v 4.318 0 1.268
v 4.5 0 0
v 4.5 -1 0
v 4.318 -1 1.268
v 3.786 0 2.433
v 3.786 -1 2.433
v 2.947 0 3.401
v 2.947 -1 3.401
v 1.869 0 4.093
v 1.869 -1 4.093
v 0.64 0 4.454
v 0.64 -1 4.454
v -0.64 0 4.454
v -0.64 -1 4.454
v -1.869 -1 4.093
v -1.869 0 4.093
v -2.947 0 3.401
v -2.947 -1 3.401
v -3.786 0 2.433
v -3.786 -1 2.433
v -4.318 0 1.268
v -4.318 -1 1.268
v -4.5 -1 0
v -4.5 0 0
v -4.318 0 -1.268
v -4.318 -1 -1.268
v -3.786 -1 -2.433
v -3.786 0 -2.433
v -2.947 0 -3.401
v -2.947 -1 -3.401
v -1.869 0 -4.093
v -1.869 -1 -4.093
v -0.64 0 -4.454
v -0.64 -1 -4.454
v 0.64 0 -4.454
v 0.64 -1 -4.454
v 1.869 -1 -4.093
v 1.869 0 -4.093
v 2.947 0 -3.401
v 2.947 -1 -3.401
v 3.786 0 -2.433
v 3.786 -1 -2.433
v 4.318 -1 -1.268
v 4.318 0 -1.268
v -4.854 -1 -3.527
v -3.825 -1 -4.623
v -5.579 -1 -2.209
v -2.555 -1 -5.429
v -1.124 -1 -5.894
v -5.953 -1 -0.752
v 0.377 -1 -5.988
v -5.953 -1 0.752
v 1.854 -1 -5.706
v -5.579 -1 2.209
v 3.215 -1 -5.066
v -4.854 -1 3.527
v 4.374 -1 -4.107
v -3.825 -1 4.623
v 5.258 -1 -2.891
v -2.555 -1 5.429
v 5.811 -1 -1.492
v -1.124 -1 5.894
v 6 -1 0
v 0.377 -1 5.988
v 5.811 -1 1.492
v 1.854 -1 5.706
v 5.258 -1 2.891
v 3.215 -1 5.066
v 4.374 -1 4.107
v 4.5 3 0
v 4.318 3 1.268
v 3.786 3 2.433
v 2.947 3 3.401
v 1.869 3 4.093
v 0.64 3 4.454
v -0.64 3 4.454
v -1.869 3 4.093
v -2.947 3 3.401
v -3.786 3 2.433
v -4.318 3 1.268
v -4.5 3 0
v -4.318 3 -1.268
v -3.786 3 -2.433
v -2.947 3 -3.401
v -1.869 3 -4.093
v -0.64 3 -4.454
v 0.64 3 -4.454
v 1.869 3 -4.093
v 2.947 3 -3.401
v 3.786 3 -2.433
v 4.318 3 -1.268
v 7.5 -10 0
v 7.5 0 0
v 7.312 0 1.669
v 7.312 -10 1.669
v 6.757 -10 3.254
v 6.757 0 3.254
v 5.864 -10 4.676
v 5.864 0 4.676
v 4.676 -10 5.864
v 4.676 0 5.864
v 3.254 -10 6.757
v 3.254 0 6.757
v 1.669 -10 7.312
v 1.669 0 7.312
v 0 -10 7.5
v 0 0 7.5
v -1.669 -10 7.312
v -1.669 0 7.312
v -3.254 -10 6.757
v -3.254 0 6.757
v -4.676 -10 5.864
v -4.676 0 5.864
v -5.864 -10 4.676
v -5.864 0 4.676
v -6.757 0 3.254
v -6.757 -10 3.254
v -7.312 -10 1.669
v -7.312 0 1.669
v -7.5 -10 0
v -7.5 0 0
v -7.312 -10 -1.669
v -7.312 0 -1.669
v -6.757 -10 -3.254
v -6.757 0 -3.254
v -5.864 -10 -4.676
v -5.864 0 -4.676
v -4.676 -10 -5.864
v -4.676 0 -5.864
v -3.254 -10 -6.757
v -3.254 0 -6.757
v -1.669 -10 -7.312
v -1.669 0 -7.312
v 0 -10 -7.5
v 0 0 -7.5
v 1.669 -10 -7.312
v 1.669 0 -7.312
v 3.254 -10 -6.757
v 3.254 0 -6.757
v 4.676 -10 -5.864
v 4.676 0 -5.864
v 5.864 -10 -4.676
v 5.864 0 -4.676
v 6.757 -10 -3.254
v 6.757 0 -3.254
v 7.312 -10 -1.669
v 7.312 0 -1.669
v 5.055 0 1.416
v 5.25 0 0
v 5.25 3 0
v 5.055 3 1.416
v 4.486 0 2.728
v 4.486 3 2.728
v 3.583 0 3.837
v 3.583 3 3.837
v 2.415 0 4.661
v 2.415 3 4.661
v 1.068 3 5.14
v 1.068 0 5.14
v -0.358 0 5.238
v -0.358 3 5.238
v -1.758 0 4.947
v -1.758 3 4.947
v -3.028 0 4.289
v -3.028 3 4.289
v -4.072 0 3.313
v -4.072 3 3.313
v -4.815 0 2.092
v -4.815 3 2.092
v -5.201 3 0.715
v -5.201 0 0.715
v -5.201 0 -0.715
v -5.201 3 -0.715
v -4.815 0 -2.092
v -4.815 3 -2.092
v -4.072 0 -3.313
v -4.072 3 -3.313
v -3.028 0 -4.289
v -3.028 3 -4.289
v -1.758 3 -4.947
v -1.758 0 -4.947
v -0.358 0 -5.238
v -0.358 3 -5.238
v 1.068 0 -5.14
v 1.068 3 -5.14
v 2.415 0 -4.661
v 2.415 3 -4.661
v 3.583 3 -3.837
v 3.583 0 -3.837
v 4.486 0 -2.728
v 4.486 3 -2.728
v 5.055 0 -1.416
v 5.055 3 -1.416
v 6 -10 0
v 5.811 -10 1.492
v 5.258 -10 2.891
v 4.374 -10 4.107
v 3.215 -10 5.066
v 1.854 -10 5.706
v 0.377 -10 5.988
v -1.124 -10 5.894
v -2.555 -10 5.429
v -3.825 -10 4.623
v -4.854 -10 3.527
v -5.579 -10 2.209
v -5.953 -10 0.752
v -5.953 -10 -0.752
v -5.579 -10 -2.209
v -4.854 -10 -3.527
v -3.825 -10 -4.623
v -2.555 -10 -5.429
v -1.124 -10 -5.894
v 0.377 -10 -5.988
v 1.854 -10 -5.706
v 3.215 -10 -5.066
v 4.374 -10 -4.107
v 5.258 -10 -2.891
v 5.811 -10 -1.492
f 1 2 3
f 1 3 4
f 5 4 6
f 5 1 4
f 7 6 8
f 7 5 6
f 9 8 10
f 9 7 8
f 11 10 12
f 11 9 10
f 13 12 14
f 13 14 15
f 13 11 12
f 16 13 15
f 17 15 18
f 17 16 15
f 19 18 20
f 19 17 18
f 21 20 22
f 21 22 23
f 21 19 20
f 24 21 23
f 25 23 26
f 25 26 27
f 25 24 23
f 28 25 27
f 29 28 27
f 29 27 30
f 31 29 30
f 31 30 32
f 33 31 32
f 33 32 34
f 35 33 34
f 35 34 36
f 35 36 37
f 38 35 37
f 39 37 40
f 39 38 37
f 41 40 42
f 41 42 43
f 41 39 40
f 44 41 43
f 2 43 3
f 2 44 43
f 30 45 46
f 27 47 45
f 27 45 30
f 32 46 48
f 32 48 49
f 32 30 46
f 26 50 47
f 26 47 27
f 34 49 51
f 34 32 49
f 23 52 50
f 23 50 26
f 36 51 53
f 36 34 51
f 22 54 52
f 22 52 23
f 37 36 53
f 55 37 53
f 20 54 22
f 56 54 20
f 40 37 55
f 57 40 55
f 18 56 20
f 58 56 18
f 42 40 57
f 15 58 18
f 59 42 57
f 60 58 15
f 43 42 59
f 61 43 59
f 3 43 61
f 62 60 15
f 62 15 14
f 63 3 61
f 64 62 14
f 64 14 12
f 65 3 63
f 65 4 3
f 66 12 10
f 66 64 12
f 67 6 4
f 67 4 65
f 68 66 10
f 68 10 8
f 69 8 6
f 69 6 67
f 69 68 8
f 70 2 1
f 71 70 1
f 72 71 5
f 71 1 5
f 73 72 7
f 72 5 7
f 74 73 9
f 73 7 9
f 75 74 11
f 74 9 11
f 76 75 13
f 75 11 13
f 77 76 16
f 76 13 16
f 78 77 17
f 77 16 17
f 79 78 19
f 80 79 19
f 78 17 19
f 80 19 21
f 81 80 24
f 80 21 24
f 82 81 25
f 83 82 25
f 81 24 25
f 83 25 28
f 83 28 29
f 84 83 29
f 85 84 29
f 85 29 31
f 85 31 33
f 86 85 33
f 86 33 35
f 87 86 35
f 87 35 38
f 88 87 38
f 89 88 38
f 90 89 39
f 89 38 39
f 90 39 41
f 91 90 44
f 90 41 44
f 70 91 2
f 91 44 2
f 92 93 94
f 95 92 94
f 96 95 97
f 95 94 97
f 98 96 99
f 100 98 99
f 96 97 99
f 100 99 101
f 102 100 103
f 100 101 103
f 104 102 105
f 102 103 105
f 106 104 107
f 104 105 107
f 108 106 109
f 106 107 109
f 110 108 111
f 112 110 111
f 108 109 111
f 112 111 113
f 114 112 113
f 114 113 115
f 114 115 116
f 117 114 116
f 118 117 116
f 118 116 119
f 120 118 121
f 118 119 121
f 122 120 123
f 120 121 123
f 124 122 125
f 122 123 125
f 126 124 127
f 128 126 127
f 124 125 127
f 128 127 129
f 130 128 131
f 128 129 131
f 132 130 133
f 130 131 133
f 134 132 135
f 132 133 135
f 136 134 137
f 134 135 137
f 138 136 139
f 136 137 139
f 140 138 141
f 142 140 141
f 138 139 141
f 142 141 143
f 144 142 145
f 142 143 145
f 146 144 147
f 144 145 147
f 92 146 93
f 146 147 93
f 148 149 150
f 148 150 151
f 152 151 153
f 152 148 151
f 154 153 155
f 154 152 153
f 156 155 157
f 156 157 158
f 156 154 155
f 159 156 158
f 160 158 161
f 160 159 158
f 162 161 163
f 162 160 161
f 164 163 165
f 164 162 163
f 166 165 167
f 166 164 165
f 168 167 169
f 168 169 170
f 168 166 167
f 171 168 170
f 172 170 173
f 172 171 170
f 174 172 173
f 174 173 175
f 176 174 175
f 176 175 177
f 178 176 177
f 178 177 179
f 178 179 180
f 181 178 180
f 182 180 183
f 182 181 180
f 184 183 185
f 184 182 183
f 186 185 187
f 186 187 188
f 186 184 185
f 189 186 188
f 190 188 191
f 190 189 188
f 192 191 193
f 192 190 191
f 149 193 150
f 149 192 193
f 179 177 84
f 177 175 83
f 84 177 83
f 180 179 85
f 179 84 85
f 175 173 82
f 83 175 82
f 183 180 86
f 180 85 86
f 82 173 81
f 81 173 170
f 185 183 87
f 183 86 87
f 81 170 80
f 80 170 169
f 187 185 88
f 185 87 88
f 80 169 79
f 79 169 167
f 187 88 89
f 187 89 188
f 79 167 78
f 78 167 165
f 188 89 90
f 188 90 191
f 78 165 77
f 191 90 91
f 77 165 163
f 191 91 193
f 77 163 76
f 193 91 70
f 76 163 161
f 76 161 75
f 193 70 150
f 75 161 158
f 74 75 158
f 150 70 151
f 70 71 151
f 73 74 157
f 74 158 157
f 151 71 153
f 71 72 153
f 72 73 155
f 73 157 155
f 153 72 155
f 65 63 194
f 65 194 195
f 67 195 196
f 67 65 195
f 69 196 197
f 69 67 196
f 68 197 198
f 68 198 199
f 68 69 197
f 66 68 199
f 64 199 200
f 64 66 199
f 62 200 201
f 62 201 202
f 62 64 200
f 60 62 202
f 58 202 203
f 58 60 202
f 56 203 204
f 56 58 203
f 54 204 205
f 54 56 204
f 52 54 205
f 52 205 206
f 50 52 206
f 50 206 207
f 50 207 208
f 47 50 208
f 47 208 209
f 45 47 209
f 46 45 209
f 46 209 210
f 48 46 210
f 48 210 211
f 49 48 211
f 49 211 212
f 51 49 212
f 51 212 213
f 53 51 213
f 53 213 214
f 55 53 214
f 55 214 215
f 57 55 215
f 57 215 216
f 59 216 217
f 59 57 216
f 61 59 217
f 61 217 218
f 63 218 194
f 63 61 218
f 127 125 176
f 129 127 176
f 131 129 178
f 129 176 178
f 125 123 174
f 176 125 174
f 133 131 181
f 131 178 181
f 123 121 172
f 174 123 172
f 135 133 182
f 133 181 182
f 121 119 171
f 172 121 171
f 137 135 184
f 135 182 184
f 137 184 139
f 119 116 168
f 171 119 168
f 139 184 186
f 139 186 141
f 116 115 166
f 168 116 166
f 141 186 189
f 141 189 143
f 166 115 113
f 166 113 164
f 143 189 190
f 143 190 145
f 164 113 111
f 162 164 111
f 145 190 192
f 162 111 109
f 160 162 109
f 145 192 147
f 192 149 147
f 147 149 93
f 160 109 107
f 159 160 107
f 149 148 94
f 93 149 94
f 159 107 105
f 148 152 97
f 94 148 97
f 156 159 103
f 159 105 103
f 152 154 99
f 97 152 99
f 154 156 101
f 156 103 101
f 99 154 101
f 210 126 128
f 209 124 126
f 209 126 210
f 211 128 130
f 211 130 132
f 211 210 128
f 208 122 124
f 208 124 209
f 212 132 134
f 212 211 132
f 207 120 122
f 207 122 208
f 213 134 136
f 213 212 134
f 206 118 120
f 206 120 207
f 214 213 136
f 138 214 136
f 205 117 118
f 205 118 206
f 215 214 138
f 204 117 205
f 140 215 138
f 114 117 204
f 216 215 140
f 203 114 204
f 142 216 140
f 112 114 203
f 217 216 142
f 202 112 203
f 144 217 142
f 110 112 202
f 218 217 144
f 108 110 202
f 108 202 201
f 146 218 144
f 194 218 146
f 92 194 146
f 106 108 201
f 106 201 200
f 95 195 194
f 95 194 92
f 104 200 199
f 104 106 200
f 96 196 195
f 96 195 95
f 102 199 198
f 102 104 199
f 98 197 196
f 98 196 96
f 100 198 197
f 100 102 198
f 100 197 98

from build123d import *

# Parameters (mm, degrees)
F0_R          = 7.5
F0_R_2        = 6
F1_DEPTH      = 10
F0_R_3        = 5.25
F2_DEPTH      = 1
F0_R_4        = 4.5
F3_DEPTH      = 1
F3_DEPTH_BACK = 3


with BuildPart() as f1:
    # F0 (on Front) → F1 (new body)
    with BuildSketch(Plane.XZ):
        Circle(F0_R)
        Circle(F0_R_2, mode=Mode.SUBTRACT)
    extrude(amount=F1_DEPTH)

    # F0 (on Front) → F2 (join)
    with BuildSketch(Plane.XZ):
        Circle(F0_R_2)
        Circle(F0_R_3, mode=Mode.SUBTRACT)
    extrude(amount=F2_DEPTH)

    # F0 (on Front) → F3 (join, two sides)
    with BuildSketch(Plane.XZ) as f3_sk:
        Circle(F0_R_3)
        Circle(F0_R_4, mode=Mode.SUBTRACT)
    extrude(amount=F3_DEPTH)
    extrude(f3_sk.sketch, amount=-F3_DEPTH_BACK)


solid = f1.part
